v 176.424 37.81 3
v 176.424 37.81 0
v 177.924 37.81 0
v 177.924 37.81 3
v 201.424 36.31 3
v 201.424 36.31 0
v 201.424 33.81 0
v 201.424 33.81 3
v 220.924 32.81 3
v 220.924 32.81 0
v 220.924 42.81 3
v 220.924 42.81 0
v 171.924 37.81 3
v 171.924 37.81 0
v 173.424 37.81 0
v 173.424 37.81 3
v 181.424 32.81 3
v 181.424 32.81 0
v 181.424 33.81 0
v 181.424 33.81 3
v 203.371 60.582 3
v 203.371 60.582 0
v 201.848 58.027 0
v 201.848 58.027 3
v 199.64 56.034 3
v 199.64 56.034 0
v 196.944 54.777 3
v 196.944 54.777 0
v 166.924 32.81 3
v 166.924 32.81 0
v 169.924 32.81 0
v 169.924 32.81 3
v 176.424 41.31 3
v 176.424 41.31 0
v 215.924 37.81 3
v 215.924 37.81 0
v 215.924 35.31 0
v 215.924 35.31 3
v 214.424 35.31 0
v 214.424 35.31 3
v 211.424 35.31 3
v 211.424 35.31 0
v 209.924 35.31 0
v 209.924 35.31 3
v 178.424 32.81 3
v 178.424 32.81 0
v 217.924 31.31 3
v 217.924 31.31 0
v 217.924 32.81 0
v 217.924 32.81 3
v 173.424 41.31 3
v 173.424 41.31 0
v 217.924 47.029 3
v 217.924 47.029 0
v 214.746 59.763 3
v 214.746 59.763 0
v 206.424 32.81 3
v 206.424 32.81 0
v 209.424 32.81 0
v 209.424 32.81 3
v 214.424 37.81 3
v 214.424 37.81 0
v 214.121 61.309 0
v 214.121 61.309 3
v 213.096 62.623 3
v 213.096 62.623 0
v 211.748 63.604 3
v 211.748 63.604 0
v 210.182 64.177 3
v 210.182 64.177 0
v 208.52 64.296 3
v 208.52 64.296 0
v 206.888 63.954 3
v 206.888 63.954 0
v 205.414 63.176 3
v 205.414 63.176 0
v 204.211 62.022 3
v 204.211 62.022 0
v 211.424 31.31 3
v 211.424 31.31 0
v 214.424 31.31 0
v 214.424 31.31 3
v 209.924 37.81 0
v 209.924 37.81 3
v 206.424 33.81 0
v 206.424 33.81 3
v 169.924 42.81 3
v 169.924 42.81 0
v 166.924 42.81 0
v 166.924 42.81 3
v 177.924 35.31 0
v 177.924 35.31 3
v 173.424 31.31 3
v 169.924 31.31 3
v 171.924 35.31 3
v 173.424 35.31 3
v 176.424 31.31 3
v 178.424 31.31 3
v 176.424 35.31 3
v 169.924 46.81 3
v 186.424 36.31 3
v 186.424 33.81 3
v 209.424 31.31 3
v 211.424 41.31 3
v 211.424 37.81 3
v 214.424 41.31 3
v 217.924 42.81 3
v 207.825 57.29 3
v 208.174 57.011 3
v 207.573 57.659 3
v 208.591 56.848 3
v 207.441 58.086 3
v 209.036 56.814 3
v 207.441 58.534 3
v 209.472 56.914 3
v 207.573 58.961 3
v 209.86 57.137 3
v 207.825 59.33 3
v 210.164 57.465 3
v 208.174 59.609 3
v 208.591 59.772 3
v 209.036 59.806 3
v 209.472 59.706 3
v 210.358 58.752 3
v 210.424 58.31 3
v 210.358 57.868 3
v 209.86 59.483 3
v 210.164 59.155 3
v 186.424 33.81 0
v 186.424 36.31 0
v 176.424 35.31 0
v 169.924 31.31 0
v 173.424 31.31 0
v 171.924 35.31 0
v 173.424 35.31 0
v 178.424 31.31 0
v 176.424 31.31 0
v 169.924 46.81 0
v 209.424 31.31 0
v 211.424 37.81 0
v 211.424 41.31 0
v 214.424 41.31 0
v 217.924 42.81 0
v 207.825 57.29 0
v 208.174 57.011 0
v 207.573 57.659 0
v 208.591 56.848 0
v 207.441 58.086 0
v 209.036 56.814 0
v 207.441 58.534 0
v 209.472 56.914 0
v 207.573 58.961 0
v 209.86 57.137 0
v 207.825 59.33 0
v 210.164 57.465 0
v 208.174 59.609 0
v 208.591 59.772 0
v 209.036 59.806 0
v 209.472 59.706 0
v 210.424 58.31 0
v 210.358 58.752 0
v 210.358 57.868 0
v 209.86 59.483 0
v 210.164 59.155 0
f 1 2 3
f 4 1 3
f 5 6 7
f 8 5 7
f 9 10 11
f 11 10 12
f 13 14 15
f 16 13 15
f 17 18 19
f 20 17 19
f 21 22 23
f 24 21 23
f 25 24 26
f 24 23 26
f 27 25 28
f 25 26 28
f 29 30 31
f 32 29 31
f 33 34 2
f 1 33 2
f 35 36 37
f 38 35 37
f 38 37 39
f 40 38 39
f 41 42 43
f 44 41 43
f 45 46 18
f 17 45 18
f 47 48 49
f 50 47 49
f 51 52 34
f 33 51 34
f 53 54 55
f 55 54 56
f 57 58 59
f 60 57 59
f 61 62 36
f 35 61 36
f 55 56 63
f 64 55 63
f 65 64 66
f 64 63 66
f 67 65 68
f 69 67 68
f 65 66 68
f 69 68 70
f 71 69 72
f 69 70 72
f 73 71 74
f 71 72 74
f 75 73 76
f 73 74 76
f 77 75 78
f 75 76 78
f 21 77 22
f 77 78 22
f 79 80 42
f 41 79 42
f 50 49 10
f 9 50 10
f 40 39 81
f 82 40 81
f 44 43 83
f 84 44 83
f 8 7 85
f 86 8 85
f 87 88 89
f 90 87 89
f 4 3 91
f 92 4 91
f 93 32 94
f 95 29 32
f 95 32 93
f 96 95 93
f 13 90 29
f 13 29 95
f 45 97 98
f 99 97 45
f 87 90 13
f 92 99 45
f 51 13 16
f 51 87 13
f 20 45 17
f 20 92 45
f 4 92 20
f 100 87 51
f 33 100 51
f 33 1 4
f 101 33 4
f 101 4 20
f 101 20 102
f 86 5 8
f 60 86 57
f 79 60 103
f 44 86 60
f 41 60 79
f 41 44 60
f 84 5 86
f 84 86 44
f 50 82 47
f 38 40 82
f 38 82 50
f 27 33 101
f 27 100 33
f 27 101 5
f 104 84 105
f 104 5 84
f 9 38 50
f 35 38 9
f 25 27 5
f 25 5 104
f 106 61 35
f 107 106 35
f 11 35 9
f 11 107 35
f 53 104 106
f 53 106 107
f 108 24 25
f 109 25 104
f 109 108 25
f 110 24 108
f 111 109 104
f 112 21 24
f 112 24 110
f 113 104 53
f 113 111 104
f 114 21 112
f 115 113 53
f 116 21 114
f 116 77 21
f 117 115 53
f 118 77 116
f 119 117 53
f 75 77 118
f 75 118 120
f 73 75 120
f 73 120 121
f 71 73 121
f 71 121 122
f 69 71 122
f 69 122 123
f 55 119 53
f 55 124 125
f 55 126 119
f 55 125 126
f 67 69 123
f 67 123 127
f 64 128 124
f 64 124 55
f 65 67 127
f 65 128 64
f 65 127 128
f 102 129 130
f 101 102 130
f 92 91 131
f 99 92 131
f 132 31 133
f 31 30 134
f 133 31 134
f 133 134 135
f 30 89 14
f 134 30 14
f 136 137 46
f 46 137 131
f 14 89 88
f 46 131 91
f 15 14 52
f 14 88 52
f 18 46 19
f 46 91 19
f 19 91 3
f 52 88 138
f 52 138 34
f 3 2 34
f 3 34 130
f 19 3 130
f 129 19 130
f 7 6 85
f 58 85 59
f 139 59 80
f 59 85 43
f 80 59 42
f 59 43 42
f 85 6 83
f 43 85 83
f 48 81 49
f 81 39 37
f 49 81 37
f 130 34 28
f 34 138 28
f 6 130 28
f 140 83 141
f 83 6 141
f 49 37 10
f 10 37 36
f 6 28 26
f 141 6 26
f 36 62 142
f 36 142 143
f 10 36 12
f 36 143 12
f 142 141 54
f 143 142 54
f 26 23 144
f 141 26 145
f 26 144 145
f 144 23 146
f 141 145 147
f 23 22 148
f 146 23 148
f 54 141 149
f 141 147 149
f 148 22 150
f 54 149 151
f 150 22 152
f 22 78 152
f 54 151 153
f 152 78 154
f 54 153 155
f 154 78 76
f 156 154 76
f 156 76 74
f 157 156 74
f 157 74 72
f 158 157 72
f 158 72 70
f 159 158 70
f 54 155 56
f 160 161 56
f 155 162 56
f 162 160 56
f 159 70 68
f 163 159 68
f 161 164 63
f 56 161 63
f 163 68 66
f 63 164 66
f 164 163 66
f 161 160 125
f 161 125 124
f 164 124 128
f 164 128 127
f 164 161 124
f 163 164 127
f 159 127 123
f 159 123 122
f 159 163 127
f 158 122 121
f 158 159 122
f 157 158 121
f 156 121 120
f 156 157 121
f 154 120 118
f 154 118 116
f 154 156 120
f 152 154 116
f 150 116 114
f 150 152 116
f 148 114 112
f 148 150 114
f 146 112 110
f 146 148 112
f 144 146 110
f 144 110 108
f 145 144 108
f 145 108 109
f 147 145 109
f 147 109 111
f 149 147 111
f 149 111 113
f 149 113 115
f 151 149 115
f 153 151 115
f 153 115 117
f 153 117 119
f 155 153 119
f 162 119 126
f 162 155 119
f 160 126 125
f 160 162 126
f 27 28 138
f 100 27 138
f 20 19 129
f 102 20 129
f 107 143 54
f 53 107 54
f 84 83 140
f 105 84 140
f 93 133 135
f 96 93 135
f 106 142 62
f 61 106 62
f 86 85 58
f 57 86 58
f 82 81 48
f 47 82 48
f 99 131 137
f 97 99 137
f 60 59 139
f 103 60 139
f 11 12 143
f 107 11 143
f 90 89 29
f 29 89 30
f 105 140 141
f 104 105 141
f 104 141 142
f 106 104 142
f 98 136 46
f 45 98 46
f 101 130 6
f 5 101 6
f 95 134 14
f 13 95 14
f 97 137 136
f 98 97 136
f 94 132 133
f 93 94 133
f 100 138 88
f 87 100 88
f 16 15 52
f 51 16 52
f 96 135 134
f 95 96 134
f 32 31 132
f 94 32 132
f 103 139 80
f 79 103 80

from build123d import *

# Parameters (mm, degrees)
ESQUISSE15_R        = 1.5
BOSS_EXTRU_15_DEPTH = 3


with BuildPart() as part:
    # Esquisse15 → Boss.-Extru.15 (new body)
    with BuildSketch(Plane.XY):
        with BuildLine():
            Line((209.424329445, 31.309985915), (211.424329445, 31.309985915))
            Line((211.424329445, 31.309985915), (211.424329445, 35.309985915))
            Line((211.424329445, 35.309985915), (209.924329445, 35.309985915))
            Line((209.924329445, 35.309985915), (209.924329445, 37.809985915))
            Line((209.924329445, 37.809985915), (211.424329445, 37.809985915))
            Line((211.424329445, 37.809985915), (211.424329445, 41.309985915))
            Line((211.424329445, 41.309985915), (214.424329445, 41.309985915))
            Line((214.424329445, 41.309985915), (214.424329445, 37.809985915))
            Line((214.424329445, 37.809985915), (215.924329445, 37.809985915))
            Line((215.924329445, 37.809985915), (215.924329445, 35.309985915))
            Line((215.924329445, 35.309985915), (214.424329445, 35.309985915))
            Line((214.424329445, 35.309985915), (214.424329445, 31.309985915))
            Line((214.424329445, 31.309985915), (217.924329445, 31.309985915))
            Line((217.924329445, 31.309985915), (217.924329445, 32.809985915))
            Line((217.924329445, 32.809985915), (220.924329445, 32.809985915))
            Line((220.924329445, 32.809985915), (220.924329445, 42.809985915))
            Line((220.924329445, 42.809985915), (217.924329445, 42.809985915))
            Line((217.924329445, 42.809985915), (217.924329445, 47.029043611))
            Line((217.924329445, 47.029043611), (214.745710446, 59.763094048))
            ThreePointArc((214.745710446, 59.763094048), (209.355265644, 64.294490405), (203.371200864, 60.582157334))
            ThreePointArc((203.371200864, 60.582157334), (200.818725519, 56.947971615), (196.944306758, 54.777415122))
            Line((196.944306758, 54.777415122), (169.924329445, 46.809985915))
            Line((169.924329445, 46.809985915), (169.924329445, 42.809985915))
            Line((169.924329445, 42.809985915), (166.924329445, 42.809985915))
            Line((166.924329445, 42.809985915), (166.924329445, 32.809985915))
            Line((166.924329445, 32.809985915), (169.924329445, 32.809985915))
            Line((169.924329445, 32.809985915), (169.924329445, 31.309985915))
            Line((169.924329445, 31.309985915), (173.424329445, 31.309985915))
            Line((173.424329445, 31.309985915), (173.424329445, 35.309985915))
            Line((173.424329445, 35.309985915), (171.924329445, 35.309985915))
            Line((171.924329445, 35.309985915), (171.924329445, 37.809985915))
            Line((171.924329445, 37.809985915), (173.424329445, 37.809985915))
            Line((173.424329445, 37.809985915), (173.424329445, 41.309985915))
            Line((173.424329445, 41.309985915), (176.424329445, 41.309985915))
            Line((176.424329445, 41.309985915), (176.424329445, 37.809985915))
            Line((176.424329445, 37.809985915), (177.924329445, 37.809985915))
            Line((177.924329445, 37.809985915), (177.924329445, 35.309985915))
            Line((177.924329445, 35.309985915), (176.424329445, 35.309985915))
            Line((176.424329445, 35.309985915), (176.424329445, 31.309985915))
            Line((176.424329445, 31.309985915), (178.424329445, 31.309985915))
            Line((178.424329445, 31.309985915), (178.424329445, 32.809985915))
            Line((178.424329445, 32.809985915), (181.424329445, 32.809985915))
            Line((181.424329445, 32.809985915), (181.424329445, 33.809985915))
            Line((181.424329445, 33.809985915), (186.424329445, 33.809985915))
            Line((186.424329445, 33.809985915), (186.424329445, 36.309985915))
            Line((186.424329445, 36.309985915), (201.424329445, 36.309985915))
            Line((201.424329445, 36.309985915), (201.424329445, 33.809985915))
            Line((201.424329445, 33.809985915), (206.424329445, 33.809985915))
            Line((206.424329445, 33.809985915), (206.424329445, 32.809985915))
            Line((206.424329445, 32.809985915), (209.424329445, 32.809985915))
            Line((209.424329445, 32.809985915), (209.424329445, 31.309985915))
        make_face()
        with Locations((208.924329445, 58.309985915)):
            Circle(ESQUISSE15_R, mode=Mode.SUBTRACT)
    extrude(amount=BOSS_EXTRU_15_DEPTH)


solid = part.part
